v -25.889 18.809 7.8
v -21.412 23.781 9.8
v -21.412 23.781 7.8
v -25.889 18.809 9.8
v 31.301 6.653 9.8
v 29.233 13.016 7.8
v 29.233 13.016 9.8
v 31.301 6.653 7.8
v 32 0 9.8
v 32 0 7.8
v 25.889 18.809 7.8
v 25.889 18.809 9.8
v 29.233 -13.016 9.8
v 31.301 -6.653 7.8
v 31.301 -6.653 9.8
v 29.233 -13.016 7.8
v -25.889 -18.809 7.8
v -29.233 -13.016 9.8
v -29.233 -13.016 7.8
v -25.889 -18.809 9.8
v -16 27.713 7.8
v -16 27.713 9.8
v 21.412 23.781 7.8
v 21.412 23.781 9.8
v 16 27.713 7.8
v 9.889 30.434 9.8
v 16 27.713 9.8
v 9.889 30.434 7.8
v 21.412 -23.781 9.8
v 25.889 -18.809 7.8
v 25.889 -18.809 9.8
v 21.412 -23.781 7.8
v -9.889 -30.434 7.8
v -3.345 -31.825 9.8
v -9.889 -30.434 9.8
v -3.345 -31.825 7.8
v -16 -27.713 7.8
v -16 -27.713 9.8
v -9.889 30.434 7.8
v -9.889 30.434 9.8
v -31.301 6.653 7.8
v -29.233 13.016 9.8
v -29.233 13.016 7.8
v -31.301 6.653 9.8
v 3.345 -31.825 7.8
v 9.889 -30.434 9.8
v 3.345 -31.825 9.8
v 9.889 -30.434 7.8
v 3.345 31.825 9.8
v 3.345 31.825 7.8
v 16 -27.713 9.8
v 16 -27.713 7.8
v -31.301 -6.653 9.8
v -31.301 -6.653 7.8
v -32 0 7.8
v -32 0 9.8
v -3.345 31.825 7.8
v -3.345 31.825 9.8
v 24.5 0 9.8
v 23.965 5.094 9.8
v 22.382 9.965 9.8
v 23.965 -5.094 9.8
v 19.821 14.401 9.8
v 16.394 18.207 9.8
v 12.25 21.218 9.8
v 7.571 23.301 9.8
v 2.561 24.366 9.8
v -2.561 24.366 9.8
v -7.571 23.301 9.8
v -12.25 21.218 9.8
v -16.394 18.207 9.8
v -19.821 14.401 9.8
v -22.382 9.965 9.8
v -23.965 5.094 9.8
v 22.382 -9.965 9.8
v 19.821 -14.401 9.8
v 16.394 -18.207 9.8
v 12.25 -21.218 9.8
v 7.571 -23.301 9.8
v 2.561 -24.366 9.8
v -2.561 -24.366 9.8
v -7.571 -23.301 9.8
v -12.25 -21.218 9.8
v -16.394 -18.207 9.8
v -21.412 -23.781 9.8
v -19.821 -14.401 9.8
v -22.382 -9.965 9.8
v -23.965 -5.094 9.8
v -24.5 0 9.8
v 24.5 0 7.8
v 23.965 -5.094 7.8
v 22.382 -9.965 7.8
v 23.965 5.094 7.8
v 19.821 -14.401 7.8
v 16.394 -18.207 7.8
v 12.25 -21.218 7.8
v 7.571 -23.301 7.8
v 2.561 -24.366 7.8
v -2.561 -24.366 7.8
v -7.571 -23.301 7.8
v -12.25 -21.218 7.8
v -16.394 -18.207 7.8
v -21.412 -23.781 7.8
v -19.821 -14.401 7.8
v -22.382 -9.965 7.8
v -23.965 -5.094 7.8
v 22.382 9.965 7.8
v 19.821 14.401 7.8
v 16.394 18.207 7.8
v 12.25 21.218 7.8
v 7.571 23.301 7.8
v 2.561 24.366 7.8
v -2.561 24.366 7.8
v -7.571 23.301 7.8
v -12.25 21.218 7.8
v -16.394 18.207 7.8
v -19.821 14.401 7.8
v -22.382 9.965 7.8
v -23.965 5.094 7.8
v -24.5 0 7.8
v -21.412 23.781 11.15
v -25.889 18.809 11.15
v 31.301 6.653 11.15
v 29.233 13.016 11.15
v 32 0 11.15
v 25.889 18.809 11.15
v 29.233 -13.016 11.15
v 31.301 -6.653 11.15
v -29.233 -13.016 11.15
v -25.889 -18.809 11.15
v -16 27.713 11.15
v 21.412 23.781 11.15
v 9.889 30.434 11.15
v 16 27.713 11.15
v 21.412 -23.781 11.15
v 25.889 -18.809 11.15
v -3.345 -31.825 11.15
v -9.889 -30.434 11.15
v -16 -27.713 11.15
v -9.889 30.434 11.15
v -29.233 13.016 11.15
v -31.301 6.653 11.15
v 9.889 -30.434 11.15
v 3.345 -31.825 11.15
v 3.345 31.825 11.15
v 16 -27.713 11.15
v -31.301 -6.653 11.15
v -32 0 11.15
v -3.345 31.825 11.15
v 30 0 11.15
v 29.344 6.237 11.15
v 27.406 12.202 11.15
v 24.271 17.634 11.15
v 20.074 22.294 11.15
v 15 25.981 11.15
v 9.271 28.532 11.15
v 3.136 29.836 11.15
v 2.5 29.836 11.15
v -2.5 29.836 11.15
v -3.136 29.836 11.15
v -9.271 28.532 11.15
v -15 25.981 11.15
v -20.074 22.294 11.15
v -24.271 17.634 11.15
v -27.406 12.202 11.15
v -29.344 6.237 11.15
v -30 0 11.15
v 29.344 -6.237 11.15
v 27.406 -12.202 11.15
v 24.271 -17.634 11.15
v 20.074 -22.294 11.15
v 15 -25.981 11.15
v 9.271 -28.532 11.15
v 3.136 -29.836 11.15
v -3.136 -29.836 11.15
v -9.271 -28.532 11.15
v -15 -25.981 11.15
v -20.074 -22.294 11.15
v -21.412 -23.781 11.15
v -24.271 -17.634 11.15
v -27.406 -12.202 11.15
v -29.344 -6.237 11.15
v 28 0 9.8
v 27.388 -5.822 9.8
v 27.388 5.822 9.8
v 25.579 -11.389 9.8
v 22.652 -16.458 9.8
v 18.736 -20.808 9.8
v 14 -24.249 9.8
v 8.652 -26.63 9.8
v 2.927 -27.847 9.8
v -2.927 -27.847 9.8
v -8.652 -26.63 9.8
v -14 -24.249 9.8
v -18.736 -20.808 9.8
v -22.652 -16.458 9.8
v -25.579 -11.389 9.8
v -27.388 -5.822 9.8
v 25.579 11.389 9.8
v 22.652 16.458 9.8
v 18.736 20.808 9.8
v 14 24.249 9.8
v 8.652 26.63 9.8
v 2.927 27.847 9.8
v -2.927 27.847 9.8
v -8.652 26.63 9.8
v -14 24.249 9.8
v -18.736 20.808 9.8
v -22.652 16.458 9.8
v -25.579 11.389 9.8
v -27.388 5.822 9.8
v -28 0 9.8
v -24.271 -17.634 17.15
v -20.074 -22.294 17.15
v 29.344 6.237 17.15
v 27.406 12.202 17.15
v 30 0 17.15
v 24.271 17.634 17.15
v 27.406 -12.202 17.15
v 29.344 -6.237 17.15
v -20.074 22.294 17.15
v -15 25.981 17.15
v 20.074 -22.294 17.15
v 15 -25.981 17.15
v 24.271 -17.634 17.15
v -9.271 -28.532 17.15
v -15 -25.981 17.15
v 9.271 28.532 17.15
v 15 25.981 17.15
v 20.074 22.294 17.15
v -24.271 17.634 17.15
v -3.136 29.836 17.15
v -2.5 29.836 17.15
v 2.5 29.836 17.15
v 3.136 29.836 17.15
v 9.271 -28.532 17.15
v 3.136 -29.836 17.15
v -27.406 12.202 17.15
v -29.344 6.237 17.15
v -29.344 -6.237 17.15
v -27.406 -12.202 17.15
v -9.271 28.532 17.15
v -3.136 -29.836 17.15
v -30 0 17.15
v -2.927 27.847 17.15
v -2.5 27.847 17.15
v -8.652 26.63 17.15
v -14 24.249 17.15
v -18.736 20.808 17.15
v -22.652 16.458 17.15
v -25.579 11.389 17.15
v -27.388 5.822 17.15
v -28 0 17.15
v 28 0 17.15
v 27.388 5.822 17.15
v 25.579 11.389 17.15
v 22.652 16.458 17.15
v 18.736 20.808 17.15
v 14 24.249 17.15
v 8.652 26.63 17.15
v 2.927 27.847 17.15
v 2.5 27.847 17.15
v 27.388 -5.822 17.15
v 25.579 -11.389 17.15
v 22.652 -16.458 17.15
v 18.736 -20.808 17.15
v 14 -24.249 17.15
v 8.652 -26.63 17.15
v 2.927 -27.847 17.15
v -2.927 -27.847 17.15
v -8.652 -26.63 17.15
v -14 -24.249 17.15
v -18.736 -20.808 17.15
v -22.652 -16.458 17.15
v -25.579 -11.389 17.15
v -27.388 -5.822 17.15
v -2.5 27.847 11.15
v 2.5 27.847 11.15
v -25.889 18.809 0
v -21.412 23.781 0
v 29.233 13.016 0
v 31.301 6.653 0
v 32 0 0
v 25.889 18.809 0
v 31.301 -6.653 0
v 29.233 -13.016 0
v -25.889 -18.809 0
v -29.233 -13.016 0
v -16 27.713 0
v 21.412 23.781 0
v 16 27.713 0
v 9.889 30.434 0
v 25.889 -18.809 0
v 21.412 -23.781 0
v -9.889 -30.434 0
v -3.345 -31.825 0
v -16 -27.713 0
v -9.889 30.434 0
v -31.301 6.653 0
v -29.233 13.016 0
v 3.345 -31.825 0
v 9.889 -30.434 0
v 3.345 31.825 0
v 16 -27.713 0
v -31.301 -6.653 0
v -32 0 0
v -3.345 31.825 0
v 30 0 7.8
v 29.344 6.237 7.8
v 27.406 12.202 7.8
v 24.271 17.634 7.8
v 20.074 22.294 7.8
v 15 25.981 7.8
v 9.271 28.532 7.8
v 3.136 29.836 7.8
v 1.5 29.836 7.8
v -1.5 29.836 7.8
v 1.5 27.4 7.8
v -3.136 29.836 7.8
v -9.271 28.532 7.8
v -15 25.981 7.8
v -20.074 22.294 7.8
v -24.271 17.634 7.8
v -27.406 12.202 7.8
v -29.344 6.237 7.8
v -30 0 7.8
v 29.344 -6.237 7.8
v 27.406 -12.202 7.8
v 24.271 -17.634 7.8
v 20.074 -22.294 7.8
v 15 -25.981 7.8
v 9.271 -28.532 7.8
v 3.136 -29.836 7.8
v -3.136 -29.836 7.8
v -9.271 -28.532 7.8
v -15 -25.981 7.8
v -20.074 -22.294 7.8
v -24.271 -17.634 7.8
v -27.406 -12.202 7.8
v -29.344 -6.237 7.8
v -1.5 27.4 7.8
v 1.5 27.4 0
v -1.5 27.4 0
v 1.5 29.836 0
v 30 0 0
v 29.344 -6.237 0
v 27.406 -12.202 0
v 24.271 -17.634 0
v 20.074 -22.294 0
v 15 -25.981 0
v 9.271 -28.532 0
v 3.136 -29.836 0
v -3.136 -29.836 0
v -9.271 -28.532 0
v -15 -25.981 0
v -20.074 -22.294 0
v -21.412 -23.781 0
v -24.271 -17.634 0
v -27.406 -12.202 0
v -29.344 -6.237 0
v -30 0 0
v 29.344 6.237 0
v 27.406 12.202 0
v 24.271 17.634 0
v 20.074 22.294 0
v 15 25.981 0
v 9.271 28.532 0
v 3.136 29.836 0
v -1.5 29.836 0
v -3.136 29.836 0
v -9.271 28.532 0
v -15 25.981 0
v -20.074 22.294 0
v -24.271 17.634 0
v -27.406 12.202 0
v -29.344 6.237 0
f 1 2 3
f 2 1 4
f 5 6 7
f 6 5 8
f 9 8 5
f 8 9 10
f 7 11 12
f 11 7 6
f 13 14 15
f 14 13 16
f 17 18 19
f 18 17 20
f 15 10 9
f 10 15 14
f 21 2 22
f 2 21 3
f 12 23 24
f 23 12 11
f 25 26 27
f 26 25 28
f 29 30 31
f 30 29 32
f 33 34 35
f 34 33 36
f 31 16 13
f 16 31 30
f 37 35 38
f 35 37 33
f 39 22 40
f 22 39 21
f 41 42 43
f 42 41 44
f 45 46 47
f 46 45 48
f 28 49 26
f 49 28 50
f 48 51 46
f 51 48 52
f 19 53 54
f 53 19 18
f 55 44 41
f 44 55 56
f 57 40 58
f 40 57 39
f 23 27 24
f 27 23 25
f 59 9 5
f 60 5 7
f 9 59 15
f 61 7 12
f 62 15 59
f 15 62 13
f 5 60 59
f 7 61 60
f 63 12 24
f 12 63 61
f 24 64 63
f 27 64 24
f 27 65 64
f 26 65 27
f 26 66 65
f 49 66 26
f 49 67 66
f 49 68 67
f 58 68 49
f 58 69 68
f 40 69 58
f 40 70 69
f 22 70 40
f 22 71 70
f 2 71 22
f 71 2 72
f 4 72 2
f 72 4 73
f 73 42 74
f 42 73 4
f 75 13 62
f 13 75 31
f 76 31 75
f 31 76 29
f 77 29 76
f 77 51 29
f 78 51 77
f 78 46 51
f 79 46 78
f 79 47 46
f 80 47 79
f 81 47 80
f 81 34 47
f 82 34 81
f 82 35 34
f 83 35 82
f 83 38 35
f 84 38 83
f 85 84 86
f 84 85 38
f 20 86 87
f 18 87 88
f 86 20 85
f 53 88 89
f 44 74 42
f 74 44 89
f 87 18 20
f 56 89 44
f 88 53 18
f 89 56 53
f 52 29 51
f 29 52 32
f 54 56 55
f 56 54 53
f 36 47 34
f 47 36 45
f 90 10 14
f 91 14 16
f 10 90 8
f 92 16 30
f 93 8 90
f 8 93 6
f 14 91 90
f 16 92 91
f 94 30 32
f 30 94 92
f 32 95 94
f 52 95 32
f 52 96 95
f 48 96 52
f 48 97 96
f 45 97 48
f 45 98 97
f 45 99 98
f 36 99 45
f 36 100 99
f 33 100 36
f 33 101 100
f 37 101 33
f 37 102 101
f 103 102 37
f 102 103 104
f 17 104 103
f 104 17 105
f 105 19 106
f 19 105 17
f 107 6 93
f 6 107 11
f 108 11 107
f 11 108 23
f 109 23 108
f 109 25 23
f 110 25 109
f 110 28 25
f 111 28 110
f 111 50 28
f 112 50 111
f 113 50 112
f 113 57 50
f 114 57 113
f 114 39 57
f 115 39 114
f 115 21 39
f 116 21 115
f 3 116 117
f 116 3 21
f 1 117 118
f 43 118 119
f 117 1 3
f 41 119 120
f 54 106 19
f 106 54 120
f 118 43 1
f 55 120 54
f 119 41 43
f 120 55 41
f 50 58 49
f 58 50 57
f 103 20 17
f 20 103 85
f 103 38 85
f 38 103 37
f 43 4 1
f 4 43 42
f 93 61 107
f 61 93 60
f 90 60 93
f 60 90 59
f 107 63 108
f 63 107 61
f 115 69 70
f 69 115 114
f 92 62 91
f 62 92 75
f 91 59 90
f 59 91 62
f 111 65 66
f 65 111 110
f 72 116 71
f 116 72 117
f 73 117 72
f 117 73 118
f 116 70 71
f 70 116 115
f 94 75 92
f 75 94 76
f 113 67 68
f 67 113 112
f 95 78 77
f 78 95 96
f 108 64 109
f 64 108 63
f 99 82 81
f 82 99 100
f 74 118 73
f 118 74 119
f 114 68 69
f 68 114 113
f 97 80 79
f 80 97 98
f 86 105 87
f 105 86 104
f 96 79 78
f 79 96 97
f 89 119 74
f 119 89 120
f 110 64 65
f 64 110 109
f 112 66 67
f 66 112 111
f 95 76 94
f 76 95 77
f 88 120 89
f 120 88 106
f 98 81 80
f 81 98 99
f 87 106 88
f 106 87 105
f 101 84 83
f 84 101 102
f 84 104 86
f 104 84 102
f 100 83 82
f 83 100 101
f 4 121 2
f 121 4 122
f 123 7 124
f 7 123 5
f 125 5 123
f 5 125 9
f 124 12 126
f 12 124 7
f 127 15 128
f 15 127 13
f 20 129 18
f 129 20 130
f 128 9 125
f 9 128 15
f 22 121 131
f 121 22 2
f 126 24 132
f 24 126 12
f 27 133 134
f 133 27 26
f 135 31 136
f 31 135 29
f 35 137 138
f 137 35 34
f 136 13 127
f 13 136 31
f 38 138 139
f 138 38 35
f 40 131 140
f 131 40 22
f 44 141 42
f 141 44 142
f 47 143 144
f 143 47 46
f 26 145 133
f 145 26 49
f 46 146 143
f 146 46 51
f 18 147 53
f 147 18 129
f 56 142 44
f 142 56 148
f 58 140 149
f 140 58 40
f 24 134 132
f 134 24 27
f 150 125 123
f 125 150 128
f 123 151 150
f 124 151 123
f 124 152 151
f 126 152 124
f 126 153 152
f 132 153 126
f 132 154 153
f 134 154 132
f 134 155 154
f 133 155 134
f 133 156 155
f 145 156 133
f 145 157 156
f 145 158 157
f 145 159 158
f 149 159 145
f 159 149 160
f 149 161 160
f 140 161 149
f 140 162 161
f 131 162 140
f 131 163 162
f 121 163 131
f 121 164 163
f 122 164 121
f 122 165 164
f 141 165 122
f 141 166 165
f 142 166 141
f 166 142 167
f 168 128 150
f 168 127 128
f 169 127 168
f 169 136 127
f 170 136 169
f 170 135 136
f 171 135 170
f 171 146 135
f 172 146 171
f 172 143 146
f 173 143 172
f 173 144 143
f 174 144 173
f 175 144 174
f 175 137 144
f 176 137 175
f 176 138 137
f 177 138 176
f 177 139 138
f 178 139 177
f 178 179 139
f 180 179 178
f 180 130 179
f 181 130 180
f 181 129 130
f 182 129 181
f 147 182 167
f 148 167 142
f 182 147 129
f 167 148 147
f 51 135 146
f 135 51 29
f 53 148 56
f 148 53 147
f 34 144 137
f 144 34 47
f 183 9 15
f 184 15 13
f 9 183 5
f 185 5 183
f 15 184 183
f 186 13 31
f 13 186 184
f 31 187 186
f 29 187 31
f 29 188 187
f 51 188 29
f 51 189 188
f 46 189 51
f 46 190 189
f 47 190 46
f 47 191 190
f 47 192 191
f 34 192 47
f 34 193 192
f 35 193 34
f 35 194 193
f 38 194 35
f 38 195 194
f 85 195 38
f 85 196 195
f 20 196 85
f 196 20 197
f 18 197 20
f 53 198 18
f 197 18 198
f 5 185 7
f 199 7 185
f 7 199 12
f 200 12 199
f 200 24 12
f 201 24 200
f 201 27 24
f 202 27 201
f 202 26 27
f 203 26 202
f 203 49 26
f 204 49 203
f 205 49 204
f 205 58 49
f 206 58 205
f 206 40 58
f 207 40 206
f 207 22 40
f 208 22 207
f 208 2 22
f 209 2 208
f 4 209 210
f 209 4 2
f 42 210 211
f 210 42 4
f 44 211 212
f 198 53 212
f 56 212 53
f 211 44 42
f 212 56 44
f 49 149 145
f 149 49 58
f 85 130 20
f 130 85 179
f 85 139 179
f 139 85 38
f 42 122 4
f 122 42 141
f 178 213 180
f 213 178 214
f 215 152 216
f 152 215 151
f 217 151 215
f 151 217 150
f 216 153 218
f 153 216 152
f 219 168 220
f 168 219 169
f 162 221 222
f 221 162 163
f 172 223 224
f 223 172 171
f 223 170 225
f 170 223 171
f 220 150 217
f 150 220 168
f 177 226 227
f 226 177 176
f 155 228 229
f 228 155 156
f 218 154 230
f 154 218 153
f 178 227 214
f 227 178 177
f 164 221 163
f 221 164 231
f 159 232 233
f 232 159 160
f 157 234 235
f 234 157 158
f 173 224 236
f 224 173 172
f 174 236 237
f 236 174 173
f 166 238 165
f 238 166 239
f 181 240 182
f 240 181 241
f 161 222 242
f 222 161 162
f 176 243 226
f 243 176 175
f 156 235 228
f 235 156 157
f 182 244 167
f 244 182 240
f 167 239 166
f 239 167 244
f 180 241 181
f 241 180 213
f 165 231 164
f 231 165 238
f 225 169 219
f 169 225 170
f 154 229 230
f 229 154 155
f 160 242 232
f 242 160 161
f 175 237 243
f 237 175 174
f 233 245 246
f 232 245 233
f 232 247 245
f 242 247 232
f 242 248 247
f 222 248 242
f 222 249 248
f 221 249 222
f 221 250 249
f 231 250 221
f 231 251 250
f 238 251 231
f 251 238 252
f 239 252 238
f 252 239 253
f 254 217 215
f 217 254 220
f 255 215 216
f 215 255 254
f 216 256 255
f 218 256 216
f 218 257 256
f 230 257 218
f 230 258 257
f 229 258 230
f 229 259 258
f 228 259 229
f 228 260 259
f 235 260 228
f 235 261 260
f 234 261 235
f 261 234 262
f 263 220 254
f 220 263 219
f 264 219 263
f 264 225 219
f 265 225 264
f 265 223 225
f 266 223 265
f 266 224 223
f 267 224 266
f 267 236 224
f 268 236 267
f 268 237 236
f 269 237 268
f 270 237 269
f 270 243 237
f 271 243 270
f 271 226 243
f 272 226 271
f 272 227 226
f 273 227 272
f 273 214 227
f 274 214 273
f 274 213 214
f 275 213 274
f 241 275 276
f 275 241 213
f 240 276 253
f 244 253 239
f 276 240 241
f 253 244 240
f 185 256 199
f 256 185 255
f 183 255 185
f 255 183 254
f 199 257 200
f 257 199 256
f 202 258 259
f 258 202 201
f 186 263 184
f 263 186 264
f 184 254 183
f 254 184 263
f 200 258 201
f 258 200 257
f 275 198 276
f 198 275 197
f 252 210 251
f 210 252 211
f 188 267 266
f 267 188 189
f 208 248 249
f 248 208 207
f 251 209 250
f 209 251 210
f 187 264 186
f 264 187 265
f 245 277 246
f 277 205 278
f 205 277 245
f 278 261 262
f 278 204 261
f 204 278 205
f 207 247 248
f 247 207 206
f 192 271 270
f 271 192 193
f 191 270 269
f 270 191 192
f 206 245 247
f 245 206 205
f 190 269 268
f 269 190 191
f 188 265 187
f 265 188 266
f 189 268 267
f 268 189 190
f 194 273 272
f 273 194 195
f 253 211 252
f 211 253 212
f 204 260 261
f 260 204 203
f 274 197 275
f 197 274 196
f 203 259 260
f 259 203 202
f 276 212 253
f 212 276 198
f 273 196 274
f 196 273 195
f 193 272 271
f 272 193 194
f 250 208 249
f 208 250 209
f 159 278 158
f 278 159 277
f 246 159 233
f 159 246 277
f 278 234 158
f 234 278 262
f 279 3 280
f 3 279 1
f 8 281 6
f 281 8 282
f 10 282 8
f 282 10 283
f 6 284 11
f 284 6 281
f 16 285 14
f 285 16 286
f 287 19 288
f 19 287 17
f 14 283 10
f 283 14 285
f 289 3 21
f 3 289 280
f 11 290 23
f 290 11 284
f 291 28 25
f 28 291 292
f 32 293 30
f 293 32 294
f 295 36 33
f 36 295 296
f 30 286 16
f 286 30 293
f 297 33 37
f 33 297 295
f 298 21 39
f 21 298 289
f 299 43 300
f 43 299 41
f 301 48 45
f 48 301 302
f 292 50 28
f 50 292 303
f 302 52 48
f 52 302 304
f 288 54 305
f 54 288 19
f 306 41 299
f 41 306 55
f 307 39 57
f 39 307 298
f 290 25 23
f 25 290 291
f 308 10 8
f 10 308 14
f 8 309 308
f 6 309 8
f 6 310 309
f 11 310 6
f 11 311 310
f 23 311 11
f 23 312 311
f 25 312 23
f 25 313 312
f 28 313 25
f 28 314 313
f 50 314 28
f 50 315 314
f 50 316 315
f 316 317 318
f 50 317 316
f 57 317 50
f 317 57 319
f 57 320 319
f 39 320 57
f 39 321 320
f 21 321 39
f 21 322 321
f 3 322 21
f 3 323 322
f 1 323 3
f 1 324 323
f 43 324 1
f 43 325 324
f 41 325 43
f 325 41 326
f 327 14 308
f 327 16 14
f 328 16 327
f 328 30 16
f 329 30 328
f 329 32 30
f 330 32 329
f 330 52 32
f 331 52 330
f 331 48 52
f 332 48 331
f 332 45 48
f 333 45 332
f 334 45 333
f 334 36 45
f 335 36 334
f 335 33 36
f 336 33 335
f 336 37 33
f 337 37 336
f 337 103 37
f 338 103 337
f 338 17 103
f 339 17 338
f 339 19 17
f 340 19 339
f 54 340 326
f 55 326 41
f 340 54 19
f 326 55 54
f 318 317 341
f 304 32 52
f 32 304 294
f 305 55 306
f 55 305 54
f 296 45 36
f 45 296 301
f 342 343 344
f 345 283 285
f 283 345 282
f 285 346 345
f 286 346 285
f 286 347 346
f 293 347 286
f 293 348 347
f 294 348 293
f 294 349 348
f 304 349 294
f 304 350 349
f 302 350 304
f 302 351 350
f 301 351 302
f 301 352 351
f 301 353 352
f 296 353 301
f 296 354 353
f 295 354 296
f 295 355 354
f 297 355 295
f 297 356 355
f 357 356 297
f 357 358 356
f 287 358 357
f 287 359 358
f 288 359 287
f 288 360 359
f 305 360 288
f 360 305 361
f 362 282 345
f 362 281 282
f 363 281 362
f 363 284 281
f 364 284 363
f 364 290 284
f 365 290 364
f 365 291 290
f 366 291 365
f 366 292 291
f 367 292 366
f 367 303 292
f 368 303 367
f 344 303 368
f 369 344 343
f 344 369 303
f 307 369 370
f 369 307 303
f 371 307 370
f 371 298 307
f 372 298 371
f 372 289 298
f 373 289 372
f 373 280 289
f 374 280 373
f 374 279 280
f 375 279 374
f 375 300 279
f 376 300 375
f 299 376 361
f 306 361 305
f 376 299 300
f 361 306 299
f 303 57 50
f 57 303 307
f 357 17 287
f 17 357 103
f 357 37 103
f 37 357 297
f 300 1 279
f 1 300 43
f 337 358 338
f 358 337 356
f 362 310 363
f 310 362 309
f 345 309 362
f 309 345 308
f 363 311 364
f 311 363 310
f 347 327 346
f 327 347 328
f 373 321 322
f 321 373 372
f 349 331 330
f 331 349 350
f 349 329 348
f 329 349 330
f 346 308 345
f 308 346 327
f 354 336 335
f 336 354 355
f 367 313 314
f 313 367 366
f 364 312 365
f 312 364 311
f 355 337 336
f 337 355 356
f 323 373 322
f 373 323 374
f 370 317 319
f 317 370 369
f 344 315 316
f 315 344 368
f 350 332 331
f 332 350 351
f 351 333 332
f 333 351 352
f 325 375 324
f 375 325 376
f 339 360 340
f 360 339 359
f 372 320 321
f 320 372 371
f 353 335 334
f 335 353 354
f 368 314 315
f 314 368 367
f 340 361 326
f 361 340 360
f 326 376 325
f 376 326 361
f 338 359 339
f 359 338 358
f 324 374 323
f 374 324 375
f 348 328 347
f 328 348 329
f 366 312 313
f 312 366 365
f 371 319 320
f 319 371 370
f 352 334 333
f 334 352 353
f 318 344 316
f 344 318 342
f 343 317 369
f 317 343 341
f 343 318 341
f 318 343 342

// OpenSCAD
// file: settingsLenghts.scad
//Ancho de la pared
pared  = 2;
//Radio del centro hueco
radioC = 11;
//Alto de la capa de apertura
aperH = 5.5;
//Ancho de la apertura
aperW = 5+1.1;//Ancho mas holgura
//Ancho del lente macro
macroW = 9.3;
//Profundidad del macro
macroH = 3;
//Profundidad parte de atras y delante
profDelante = 6;
profAtras = 6;
//Ceja entre uniones de cilindros
cejaH = 6;
guiaParedW = 2;
tmpHolg = 1.8;


//Correcc

//
//CÁMARA
camP = 3;//Grueso de la pared del presente modelo
camW = 105;//Ancho de la cámara
camH = 61;//Alto de la cámara
camD = 23.5;//Profundidad de la cámara
camHlg = 6;//Holgura que se deja para los tornillos
camLW = 57/2;//Radio del exterior del lente
torW  = 2;//Radio

//
//Ancho de tubo principal (grande)
mcW = 32;//radio
mcH = 28;

//Dimensiones del difractador
diffW = 51;//Alto y Ancho
diffD=1;//Profundidad del difractador
diffWinW=36;//Ancho de la ventana de difracción
diffWinH=24;//Alto de la ventana de difracción

//
//Adquisición de luz
luzHBig = 10; //donde va el tornillo
luzWBig = 28; //27:diametro donde va el tornillo
luzHBigT = 4; //alto del tornillo
luzWBigT = 6; //6: ancho del tornillo
luzHRosca = 7; //donde va la rosca
luzWRosca = 23; //22:diametro de donde va la rosca



//Cuadro guia para que no se mueva
guiaH = cejaH;
guiaW = 3;



module creaPared(h){
	difference(){
		//Pone el cilindro principal
		cylinder(r=mcW,h);

		//Le quita el contorno exterior
		translate([0,0,-0.1])
		cylinder(r=mcW-pared,h+0.2);
	}
}
module creaGuiaTornilloCentrada(){
	translate([-luzWBigT/2,-luzWBigT/2,0])
	cube([luzWBigT,luzWBigT,luzHBig-1+0.2]);
}
module creaGuiaTornilloCentradaArea(){
	tmpW = luzWBigT + pared;
	tmpH = luzHBig  + pared;
	translate([-tmpW/2,-tmpW/2,0])
	cube([tmpW,tmpW,tmpH]);
}
module creaGuia(h){
	//Pone el circulo soporte
	difference(){
		cylinder(r=mcW,h);
		translate([0,0,-0.1])
		cylinder(r=mcW-pared,h+0.2);
	}
	//Pone la guia1
	translate([0,mcW-pared-(guiaW/2)+0.4,0])
	creaGuiaCentrada(h);
}
module creaGuiaHembra(h){
	//Pone el circulo soporte
	tmpW = mcW-guiaW;	
	creaPared(sopH);
	sopH = 1.35;
	
	//Pone la pared de la guia
	difference(){
		cylinder(r=(mcW-pared),sopH+h);
		translate([0,0,-0.1])
		cylinder(r=(mcW-pared-guiaParedW),sopH+h+0.2);
		//Pone la guia
		translate([-(guiaW/3),tmpW,sopH])
		creaGuiaCentrada(sopH+h+0.2);
		translate([(guiaW/3),tmpW,sopH])
		creaGuiaCentrada(sopH+h+0.2);
	}
}
module creaGuiaCentrada(h){
	translate([-guiaW/2,-guiaW/2,0])
	cube([guiaW,guiaW,h]);
}
// main file
include <settingsLenghts.scad>


/////////////////////////////////////

// Cuanto se deja entre la tapa auxiliar y la planta alta
tmpHolg = 1.8;

//Pone la apertura
translate([0,0,cejaH+tmpHolg])
creaCilApertura();

//Pone la guia hembra
translate([0,0,cejaH+pared+tmpHolg])
creaGuiaHembra(cejaH);

//Pone guia macho
creaGuia(cejaH+tmpHolg);





module creaCilApertura(){
	apertW = 49/2;//Radio
	difference(){
		//Pone el cilindro principal
		cylinder(r=mcW,pared);

		//Le quita la apertura
		translate([0,0,-0.1])
		cylinder(r=apertW,pared+0.2);
	}
}
